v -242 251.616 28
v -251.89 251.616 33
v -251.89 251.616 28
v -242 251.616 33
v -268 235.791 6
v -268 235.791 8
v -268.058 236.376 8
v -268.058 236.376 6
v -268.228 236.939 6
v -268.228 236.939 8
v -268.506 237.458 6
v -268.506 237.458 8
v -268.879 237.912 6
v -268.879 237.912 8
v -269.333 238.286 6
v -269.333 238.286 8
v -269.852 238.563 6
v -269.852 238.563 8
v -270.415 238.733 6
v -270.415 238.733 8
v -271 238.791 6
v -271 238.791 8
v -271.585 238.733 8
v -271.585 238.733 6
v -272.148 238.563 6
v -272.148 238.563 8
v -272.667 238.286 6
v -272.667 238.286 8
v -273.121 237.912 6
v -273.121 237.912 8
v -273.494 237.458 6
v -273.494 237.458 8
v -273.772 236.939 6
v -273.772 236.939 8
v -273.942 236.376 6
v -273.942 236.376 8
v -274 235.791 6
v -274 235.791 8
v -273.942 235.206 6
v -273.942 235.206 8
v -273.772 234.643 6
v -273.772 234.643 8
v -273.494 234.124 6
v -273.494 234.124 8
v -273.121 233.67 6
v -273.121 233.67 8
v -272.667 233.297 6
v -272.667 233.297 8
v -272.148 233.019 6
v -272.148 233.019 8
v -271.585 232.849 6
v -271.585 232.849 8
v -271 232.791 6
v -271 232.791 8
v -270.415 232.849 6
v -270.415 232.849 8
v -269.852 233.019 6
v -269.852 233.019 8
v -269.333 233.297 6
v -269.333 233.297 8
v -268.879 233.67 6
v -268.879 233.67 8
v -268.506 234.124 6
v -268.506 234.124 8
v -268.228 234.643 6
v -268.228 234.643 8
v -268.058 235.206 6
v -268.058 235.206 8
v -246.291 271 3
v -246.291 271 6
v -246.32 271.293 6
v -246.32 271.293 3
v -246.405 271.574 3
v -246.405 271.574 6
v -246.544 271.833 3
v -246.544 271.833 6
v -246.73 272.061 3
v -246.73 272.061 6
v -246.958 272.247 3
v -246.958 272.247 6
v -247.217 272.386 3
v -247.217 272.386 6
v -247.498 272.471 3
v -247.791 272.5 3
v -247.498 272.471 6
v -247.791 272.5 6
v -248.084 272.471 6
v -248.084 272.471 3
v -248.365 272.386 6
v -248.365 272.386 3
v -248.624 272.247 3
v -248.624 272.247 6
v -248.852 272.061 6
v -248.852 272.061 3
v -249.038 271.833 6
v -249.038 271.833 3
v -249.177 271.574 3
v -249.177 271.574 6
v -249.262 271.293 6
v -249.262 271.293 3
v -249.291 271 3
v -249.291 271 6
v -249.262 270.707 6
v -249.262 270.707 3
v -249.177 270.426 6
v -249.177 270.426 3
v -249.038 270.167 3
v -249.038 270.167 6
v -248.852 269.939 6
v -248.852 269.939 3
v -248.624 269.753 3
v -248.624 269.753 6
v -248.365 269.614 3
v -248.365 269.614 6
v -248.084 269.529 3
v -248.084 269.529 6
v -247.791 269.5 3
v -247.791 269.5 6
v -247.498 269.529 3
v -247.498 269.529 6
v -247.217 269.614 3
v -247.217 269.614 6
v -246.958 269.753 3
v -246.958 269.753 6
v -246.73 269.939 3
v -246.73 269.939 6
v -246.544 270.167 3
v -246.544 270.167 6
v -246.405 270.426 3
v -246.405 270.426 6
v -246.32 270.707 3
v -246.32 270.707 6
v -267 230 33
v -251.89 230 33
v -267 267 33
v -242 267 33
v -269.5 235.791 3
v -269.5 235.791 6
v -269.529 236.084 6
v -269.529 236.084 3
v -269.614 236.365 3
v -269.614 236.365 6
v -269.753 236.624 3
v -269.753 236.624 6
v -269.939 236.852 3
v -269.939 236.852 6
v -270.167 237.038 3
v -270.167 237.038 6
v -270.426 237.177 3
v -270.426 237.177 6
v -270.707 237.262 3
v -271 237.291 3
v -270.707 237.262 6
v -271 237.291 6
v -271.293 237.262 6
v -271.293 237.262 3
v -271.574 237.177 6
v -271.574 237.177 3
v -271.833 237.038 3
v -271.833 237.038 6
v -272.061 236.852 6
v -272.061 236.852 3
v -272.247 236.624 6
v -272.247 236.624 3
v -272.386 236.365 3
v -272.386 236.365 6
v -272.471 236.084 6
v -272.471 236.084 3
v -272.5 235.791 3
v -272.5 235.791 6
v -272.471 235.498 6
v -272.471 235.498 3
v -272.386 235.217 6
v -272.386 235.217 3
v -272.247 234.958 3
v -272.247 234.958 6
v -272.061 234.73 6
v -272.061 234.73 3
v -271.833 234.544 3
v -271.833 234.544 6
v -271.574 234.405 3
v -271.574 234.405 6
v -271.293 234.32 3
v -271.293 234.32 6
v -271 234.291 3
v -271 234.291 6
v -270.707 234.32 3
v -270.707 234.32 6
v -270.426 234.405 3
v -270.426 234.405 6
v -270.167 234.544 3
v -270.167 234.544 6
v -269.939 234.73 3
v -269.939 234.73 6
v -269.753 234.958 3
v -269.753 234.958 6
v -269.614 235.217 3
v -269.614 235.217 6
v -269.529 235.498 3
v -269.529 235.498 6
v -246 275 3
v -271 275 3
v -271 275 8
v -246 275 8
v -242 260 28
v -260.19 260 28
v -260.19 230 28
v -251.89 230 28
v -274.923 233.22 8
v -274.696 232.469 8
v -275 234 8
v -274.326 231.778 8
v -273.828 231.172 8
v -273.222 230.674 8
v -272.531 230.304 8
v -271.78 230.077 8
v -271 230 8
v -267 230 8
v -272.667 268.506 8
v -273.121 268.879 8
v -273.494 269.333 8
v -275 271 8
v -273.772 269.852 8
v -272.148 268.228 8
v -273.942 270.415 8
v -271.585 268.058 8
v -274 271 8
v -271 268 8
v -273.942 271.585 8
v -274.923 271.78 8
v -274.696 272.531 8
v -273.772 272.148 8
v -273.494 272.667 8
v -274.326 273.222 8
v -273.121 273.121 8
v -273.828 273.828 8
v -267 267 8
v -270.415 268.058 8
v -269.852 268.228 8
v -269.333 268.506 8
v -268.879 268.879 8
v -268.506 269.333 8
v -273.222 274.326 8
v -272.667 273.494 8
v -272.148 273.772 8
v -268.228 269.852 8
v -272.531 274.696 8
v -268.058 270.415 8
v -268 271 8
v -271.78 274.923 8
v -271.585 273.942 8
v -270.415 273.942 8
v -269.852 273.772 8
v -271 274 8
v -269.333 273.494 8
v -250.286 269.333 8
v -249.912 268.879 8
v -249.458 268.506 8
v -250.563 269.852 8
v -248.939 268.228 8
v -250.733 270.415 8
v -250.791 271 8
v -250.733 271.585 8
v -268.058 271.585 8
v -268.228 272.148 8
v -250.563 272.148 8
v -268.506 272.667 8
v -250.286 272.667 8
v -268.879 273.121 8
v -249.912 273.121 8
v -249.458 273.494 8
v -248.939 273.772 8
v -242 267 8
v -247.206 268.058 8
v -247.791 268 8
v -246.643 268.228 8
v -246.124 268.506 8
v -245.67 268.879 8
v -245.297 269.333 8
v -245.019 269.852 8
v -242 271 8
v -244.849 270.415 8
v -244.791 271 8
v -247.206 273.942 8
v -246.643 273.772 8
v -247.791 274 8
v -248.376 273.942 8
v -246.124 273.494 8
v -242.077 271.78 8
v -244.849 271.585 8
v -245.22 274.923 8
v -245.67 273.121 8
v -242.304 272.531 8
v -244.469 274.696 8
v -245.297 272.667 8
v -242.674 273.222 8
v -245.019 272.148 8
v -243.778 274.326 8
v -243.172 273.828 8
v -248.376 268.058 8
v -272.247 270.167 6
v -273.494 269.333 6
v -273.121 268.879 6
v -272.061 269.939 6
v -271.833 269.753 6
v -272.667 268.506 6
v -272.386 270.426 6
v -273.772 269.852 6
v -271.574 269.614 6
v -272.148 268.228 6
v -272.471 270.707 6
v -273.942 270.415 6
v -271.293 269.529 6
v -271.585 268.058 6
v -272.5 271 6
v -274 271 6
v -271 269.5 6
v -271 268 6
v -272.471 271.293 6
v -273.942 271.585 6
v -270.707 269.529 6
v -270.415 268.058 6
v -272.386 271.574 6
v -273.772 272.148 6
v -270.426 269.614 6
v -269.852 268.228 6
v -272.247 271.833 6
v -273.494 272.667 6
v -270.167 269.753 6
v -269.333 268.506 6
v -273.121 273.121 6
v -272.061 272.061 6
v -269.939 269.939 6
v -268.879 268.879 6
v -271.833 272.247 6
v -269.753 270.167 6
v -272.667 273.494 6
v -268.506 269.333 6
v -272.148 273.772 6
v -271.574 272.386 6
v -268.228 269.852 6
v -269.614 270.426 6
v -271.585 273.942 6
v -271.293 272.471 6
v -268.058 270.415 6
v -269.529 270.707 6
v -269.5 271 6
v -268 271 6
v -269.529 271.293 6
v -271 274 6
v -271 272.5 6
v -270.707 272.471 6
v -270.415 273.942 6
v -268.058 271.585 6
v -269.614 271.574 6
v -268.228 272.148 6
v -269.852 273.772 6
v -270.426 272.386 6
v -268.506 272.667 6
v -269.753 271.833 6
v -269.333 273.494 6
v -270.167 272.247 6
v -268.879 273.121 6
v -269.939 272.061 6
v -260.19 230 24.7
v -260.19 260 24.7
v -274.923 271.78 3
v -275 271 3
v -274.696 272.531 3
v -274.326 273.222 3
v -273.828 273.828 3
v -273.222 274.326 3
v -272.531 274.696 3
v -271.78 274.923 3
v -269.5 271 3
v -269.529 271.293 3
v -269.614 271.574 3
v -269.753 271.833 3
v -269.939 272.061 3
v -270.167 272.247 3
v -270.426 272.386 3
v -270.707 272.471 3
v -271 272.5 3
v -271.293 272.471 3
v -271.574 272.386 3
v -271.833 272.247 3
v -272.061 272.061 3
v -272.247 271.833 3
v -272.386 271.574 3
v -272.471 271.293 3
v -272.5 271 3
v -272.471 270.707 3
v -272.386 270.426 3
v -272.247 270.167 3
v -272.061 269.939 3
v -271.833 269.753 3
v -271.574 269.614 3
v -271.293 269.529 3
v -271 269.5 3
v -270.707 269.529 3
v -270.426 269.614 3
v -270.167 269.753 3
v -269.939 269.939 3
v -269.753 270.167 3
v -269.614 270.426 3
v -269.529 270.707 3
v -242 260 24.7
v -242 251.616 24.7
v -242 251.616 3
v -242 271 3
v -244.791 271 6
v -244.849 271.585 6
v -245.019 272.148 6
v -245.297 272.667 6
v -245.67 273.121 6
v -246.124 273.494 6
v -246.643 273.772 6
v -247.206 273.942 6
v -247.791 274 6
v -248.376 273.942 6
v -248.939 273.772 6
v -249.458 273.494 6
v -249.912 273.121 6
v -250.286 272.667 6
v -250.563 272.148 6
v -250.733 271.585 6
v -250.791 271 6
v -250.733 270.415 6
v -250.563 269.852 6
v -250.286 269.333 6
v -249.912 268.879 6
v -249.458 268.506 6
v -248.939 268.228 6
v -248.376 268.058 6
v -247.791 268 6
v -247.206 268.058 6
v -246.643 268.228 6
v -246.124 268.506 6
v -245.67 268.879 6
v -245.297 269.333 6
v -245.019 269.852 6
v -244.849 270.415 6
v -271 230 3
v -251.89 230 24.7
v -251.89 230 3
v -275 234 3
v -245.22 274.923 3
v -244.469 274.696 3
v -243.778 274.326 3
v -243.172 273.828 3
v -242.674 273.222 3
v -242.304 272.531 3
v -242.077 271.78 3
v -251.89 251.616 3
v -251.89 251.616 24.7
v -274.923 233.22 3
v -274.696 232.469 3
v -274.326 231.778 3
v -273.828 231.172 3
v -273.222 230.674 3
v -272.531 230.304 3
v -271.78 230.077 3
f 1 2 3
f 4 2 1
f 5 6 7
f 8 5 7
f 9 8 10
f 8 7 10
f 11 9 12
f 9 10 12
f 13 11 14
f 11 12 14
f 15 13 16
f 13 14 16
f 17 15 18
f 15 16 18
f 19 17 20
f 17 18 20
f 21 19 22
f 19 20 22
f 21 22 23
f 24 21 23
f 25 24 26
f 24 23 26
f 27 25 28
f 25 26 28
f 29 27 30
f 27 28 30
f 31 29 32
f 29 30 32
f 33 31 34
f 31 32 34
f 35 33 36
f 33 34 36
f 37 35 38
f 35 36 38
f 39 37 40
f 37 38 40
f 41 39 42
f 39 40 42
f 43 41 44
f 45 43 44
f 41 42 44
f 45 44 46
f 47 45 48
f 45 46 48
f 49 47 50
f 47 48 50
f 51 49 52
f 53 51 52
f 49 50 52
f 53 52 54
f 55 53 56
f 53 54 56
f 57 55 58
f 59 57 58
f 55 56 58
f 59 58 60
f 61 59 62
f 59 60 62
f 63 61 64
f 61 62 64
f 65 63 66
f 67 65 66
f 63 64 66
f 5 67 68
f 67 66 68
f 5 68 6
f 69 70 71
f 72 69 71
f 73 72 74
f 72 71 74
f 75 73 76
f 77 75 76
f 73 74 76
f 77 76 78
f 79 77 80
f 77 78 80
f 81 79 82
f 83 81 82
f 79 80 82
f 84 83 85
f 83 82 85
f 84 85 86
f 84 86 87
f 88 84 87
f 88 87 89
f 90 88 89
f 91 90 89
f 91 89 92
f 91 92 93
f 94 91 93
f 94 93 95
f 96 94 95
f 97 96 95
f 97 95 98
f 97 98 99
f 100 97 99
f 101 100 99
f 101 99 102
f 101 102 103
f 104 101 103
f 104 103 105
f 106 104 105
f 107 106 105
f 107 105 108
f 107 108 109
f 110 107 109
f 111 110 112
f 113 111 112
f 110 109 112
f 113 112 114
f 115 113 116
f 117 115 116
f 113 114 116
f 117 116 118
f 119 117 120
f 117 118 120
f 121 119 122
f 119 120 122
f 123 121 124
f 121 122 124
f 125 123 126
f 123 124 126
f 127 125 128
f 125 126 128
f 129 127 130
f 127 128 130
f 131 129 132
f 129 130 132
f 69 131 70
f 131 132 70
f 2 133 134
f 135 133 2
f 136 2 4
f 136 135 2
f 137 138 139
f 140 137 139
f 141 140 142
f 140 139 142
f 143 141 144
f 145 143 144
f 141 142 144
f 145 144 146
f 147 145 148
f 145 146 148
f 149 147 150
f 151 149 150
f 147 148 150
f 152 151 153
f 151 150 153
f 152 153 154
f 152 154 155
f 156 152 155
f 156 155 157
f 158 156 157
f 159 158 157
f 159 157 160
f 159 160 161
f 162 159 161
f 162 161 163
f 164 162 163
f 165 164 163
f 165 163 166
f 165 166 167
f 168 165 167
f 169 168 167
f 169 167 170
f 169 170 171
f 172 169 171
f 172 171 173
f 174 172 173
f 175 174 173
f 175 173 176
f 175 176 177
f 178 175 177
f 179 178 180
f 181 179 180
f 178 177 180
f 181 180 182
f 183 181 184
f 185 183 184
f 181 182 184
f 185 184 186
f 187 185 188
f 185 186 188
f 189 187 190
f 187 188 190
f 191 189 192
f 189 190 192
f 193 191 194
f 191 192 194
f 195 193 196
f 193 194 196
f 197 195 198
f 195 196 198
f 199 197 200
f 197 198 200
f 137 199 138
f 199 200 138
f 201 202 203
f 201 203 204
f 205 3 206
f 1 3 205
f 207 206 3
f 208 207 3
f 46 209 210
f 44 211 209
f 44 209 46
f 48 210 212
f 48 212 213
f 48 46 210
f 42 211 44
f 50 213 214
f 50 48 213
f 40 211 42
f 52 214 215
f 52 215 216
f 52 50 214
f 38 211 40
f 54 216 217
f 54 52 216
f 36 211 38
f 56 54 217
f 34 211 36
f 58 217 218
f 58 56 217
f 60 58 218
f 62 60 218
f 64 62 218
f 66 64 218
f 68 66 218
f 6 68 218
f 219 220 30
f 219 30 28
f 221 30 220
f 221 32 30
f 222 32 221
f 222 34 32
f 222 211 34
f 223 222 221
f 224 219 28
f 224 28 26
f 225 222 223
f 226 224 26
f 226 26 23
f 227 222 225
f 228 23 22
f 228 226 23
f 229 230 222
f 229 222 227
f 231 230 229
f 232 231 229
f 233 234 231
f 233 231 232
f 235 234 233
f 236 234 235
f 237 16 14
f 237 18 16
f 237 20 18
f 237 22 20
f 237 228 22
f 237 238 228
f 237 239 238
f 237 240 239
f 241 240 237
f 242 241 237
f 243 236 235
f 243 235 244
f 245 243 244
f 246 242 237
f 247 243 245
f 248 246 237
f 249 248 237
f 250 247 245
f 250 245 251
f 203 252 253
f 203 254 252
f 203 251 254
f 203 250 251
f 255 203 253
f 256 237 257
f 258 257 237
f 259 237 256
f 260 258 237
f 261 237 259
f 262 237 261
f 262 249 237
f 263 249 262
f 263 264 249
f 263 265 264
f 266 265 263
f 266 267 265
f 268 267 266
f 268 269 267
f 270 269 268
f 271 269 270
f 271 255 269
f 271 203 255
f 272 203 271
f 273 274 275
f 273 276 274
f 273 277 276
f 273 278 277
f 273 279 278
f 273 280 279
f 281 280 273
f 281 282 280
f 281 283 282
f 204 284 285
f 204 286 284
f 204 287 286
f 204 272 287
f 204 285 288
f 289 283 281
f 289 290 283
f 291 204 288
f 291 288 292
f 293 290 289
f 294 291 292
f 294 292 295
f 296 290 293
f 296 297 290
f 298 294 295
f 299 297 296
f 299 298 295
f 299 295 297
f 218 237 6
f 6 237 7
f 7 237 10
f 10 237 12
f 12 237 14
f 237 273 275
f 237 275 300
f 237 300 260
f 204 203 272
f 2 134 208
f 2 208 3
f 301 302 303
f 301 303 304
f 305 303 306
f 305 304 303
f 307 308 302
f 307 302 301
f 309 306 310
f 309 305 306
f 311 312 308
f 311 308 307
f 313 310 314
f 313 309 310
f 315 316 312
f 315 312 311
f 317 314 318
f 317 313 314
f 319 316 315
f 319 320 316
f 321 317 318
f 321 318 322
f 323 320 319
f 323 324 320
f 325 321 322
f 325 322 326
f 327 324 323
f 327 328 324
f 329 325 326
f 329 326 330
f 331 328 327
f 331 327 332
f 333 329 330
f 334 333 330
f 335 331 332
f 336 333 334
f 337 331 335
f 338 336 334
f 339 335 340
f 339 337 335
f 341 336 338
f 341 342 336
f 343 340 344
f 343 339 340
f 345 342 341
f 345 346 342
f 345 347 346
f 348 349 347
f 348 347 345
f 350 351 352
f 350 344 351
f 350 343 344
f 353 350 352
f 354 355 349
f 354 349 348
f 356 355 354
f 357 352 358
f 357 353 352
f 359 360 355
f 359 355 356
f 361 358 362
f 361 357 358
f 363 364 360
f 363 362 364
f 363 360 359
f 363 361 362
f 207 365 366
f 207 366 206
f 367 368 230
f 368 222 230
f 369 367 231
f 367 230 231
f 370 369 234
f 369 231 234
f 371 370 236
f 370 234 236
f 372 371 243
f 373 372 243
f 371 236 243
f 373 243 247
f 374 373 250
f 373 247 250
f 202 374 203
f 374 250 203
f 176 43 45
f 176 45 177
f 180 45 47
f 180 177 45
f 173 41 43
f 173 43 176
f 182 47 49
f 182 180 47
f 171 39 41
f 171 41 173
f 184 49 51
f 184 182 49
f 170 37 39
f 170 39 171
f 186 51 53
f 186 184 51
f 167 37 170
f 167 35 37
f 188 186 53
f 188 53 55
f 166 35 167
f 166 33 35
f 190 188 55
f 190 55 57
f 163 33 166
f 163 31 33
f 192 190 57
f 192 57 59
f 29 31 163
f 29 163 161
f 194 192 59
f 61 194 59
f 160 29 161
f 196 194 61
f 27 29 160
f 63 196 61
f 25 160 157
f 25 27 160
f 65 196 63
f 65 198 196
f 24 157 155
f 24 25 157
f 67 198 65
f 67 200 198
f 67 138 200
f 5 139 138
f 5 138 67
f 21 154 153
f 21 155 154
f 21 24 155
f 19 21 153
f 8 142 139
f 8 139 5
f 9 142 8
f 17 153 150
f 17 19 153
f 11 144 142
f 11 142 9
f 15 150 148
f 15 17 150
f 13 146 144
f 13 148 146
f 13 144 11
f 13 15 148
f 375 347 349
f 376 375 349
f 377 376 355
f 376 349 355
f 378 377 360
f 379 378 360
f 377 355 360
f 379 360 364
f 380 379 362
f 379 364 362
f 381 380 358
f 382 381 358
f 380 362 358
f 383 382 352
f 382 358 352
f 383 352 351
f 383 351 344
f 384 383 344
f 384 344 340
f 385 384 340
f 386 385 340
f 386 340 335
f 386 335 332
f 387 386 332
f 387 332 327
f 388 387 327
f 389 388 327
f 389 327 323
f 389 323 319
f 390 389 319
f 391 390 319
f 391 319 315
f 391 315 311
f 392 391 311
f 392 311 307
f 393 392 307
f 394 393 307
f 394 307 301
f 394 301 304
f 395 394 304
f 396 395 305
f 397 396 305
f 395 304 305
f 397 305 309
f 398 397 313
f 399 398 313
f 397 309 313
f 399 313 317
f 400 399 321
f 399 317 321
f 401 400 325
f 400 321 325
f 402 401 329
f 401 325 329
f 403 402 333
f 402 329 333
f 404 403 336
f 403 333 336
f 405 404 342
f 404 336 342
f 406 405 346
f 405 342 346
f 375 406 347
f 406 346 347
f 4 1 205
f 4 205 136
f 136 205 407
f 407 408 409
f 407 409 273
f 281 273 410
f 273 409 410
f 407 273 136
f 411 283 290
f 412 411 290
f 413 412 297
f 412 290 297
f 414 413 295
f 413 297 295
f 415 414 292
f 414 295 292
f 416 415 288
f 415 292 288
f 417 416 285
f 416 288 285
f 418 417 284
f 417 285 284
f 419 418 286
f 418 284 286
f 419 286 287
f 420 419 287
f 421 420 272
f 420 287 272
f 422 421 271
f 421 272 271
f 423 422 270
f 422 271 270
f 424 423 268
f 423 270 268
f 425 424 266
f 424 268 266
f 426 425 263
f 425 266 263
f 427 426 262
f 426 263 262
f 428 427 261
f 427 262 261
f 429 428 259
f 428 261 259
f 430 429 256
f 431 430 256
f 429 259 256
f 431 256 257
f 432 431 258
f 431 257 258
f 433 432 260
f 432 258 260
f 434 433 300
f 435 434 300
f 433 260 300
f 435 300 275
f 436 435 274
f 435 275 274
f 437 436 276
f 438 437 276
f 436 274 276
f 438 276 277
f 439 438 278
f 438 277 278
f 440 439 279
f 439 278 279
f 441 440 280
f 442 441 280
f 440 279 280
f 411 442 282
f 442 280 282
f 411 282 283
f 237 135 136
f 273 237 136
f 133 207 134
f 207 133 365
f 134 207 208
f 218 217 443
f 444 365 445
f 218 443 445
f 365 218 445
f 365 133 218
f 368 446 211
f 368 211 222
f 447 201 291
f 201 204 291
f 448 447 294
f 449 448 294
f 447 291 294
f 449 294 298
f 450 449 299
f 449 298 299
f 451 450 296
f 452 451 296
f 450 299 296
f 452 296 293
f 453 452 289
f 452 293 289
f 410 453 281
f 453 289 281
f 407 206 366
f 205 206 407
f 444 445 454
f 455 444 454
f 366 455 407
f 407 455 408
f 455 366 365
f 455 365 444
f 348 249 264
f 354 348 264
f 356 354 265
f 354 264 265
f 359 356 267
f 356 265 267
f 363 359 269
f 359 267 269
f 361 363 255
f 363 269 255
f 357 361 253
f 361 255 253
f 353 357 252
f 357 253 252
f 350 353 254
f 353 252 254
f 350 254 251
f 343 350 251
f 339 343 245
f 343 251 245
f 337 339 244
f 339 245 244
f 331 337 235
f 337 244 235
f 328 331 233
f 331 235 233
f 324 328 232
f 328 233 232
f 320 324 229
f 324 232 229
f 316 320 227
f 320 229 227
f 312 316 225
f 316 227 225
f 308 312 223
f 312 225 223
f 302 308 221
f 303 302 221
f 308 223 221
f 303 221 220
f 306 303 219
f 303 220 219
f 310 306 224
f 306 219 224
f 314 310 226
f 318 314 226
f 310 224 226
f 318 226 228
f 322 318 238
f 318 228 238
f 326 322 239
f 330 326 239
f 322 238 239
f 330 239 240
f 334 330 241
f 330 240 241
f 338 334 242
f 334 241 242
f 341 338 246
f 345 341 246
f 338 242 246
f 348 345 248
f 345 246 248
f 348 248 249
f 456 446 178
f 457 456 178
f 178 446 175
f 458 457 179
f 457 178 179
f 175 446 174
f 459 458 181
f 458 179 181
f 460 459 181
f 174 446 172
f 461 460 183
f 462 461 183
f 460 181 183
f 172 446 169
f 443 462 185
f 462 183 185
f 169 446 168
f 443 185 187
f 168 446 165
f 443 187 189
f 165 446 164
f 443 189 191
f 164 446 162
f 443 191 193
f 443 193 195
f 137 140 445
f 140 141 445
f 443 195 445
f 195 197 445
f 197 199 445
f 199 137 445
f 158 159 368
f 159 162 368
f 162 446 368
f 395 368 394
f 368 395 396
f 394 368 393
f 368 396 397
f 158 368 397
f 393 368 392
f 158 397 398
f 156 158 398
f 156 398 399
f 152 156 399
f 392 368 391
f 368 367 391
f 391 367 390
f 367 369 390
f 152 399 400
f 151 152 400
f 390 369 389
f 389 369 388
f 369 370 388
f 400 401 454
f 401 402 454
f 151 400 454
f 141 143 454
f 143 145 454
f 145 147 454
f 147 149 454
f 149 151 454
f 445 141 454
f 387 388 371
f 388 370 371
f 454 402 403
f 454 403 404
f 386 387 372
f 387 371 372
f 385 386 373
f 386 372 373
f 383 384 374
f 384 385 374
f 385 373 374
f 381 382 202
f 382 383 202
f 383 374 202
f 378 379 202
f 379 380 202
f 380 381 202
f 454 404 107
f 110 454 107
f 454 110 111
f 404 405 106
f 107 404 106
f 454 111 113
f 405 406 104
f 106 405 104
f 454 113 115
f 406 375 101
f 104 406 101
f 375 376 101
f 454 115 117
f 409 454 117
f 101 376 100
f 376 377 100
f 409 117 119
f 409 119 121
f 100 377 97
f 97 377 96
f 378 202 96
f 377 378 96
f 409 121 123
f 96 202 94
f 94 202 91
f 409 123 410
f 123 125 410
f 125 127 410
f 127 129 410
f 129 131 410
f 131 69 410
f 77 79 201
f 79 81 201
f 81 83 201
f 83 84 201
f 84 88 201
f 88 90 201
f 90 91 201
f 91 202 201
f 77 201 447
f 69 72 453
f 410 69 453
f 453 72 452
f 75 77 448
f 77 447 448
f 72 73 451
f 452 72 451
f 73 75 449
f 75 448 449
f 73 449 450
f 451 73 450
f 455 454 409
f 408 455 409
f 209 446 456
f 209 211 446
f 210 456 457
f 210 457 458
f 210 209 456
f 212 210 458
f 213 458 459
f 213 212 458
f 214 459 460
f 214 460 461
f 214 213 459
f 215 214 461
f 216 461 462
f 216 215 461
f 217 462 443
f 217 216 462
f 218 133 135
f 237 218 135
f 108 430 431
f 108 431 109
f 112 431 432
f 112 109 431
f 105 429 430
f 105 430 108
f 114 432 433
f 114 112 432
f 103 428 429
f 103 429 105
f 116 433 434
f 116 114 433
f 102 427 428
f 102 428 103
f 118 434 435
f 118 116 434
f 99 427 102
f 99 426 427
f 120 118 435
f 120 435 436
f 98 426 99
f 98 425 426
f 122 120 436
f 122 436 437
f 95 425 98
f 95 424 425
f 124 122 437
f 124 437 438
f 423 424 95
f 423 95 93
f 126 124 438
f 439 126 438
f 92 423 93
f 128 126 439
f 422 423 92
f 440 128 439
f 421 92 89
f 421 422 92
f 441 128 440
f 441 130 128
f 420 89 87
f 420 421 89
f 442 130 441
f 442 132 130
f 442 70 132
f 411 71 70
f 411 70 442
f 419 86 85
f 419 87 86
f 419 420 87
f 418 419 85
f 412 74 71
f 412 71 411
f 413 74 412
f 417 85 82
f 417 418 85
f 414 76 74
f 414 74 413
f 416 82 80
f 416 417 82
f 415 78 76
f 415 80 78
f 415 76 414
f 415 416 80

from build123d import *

# Parameters (mm, degrees)
SKETCH021_W     = 33
SKETCH021_H     = 45
PAD004_DEPTH    = 30
POCKET012_DEPTH = 25
SKETCH023_R     = 1.5
POCKET013_DEPTH = 5.001
SKETCH024_R     = 3
POCKET014_DEPTH = 2
FILLET005_R     = 4
SKETCH025_W     = 22.162351
SKETCH025_H     = 3.3
POCKET015_DEPTH = 30
SKETCH026_W     = 15.81044
SKETCH026_H     = 25.49089
POCKET016_DEPTH = 30.001


with BuildPart() as part:
    # Sketch021 → Pad004 (new body)
    with BuildSketch(Plane.XY):
        with Locations((-258.5, 252.5)):
            Rectangle(SKETCH021_W, SKETCH021_H)
    extrude(amount=PAD004_DEPTH)

    # Sketch022 (on Face6 of Pad004) → Pocket012 (cut)
    with BuildSketch(Plane.XY.offset(30)):
        Polygon((-302.024292, 225.851654), (-267, 225.851654), (-267, 267), (-233.564453, 267), (-233.564453, 282.862976), (-302.024292, 282.862976), align=None)
    extrude(amount=-POCKET012_DEPTH, mode=Mode.SUBTRACT)

    # Sketch023 (on Face6 of Pocket012) → Pocket013 (cut, through all)
    with BuildSketch(Plane.XY.offset(5)):
        with Locations((-247.791107, 271)):
            Circle(SKETCH023_R)
        with Locations((-271, 235.791107)):
            Circle(SKETCH023_R)
        with Locations((-271, 271)):
            Circle(SKETCH023_R)
    extrude(amount=-POCKET013_DEPTH, mode=Mode.SUBTRACT)

    # Sketch024 (on Face6 of Pocket013) → Pocket014 (cut)
    with BuildSketch(Plane.XY.offset(5)):
        with Locations((-271, 271)):
            Circle(SKETCH024_R)
        with Locations((-247.791107, 271)):
            Circle(SKETCH024_R)
        with Locations((-271, 235.791107)):
            Circle(SKETCH024_R)
    extrude(amount=-POCKET014_DEPTH, mode=Mode.SUBTRACT)

    # Fillet005
    fillet005_edges = [part.edges().sort_by_distance(p)[0] for p in [
        (-275, 275, 2.5),
        (-242, 275, 2.5),
        (-275, 230, 2.5),
    ]]
    fillet(fillet005_edges, radius=FILLET005_R)

    # Sketch025 (on Face1 of Fillet005) → Pocket015 (cut)
    with BuildSketch(Plane.XZ.offset(-230)):
        with Locations((-249.108824, 23.35)):
            Rectangle(SKETCH025_W, SKETCH025_H)
    extrude(amount=-POCKET015_DEPTH, mode=Mode.SUBTRACT)

    # Sketch026 (on Face7 of Pocket015) → Pocket016 (cut, through all)
    with BuildSketch(Plane.XY.offset(30)):
        with Locations((-243.98507, 238.870476)):
            Rectangle(SKETCH026_W, SKETCH026_H)
    extrude(amount=-POCKET016_DEPTH, mode=Mode.SUBTRACT)


with BuildPart() as part_1:
    # Body004 placement: moved
    add(part.part.moved(Location((0, 0, 3))))


solid = part_1.part
